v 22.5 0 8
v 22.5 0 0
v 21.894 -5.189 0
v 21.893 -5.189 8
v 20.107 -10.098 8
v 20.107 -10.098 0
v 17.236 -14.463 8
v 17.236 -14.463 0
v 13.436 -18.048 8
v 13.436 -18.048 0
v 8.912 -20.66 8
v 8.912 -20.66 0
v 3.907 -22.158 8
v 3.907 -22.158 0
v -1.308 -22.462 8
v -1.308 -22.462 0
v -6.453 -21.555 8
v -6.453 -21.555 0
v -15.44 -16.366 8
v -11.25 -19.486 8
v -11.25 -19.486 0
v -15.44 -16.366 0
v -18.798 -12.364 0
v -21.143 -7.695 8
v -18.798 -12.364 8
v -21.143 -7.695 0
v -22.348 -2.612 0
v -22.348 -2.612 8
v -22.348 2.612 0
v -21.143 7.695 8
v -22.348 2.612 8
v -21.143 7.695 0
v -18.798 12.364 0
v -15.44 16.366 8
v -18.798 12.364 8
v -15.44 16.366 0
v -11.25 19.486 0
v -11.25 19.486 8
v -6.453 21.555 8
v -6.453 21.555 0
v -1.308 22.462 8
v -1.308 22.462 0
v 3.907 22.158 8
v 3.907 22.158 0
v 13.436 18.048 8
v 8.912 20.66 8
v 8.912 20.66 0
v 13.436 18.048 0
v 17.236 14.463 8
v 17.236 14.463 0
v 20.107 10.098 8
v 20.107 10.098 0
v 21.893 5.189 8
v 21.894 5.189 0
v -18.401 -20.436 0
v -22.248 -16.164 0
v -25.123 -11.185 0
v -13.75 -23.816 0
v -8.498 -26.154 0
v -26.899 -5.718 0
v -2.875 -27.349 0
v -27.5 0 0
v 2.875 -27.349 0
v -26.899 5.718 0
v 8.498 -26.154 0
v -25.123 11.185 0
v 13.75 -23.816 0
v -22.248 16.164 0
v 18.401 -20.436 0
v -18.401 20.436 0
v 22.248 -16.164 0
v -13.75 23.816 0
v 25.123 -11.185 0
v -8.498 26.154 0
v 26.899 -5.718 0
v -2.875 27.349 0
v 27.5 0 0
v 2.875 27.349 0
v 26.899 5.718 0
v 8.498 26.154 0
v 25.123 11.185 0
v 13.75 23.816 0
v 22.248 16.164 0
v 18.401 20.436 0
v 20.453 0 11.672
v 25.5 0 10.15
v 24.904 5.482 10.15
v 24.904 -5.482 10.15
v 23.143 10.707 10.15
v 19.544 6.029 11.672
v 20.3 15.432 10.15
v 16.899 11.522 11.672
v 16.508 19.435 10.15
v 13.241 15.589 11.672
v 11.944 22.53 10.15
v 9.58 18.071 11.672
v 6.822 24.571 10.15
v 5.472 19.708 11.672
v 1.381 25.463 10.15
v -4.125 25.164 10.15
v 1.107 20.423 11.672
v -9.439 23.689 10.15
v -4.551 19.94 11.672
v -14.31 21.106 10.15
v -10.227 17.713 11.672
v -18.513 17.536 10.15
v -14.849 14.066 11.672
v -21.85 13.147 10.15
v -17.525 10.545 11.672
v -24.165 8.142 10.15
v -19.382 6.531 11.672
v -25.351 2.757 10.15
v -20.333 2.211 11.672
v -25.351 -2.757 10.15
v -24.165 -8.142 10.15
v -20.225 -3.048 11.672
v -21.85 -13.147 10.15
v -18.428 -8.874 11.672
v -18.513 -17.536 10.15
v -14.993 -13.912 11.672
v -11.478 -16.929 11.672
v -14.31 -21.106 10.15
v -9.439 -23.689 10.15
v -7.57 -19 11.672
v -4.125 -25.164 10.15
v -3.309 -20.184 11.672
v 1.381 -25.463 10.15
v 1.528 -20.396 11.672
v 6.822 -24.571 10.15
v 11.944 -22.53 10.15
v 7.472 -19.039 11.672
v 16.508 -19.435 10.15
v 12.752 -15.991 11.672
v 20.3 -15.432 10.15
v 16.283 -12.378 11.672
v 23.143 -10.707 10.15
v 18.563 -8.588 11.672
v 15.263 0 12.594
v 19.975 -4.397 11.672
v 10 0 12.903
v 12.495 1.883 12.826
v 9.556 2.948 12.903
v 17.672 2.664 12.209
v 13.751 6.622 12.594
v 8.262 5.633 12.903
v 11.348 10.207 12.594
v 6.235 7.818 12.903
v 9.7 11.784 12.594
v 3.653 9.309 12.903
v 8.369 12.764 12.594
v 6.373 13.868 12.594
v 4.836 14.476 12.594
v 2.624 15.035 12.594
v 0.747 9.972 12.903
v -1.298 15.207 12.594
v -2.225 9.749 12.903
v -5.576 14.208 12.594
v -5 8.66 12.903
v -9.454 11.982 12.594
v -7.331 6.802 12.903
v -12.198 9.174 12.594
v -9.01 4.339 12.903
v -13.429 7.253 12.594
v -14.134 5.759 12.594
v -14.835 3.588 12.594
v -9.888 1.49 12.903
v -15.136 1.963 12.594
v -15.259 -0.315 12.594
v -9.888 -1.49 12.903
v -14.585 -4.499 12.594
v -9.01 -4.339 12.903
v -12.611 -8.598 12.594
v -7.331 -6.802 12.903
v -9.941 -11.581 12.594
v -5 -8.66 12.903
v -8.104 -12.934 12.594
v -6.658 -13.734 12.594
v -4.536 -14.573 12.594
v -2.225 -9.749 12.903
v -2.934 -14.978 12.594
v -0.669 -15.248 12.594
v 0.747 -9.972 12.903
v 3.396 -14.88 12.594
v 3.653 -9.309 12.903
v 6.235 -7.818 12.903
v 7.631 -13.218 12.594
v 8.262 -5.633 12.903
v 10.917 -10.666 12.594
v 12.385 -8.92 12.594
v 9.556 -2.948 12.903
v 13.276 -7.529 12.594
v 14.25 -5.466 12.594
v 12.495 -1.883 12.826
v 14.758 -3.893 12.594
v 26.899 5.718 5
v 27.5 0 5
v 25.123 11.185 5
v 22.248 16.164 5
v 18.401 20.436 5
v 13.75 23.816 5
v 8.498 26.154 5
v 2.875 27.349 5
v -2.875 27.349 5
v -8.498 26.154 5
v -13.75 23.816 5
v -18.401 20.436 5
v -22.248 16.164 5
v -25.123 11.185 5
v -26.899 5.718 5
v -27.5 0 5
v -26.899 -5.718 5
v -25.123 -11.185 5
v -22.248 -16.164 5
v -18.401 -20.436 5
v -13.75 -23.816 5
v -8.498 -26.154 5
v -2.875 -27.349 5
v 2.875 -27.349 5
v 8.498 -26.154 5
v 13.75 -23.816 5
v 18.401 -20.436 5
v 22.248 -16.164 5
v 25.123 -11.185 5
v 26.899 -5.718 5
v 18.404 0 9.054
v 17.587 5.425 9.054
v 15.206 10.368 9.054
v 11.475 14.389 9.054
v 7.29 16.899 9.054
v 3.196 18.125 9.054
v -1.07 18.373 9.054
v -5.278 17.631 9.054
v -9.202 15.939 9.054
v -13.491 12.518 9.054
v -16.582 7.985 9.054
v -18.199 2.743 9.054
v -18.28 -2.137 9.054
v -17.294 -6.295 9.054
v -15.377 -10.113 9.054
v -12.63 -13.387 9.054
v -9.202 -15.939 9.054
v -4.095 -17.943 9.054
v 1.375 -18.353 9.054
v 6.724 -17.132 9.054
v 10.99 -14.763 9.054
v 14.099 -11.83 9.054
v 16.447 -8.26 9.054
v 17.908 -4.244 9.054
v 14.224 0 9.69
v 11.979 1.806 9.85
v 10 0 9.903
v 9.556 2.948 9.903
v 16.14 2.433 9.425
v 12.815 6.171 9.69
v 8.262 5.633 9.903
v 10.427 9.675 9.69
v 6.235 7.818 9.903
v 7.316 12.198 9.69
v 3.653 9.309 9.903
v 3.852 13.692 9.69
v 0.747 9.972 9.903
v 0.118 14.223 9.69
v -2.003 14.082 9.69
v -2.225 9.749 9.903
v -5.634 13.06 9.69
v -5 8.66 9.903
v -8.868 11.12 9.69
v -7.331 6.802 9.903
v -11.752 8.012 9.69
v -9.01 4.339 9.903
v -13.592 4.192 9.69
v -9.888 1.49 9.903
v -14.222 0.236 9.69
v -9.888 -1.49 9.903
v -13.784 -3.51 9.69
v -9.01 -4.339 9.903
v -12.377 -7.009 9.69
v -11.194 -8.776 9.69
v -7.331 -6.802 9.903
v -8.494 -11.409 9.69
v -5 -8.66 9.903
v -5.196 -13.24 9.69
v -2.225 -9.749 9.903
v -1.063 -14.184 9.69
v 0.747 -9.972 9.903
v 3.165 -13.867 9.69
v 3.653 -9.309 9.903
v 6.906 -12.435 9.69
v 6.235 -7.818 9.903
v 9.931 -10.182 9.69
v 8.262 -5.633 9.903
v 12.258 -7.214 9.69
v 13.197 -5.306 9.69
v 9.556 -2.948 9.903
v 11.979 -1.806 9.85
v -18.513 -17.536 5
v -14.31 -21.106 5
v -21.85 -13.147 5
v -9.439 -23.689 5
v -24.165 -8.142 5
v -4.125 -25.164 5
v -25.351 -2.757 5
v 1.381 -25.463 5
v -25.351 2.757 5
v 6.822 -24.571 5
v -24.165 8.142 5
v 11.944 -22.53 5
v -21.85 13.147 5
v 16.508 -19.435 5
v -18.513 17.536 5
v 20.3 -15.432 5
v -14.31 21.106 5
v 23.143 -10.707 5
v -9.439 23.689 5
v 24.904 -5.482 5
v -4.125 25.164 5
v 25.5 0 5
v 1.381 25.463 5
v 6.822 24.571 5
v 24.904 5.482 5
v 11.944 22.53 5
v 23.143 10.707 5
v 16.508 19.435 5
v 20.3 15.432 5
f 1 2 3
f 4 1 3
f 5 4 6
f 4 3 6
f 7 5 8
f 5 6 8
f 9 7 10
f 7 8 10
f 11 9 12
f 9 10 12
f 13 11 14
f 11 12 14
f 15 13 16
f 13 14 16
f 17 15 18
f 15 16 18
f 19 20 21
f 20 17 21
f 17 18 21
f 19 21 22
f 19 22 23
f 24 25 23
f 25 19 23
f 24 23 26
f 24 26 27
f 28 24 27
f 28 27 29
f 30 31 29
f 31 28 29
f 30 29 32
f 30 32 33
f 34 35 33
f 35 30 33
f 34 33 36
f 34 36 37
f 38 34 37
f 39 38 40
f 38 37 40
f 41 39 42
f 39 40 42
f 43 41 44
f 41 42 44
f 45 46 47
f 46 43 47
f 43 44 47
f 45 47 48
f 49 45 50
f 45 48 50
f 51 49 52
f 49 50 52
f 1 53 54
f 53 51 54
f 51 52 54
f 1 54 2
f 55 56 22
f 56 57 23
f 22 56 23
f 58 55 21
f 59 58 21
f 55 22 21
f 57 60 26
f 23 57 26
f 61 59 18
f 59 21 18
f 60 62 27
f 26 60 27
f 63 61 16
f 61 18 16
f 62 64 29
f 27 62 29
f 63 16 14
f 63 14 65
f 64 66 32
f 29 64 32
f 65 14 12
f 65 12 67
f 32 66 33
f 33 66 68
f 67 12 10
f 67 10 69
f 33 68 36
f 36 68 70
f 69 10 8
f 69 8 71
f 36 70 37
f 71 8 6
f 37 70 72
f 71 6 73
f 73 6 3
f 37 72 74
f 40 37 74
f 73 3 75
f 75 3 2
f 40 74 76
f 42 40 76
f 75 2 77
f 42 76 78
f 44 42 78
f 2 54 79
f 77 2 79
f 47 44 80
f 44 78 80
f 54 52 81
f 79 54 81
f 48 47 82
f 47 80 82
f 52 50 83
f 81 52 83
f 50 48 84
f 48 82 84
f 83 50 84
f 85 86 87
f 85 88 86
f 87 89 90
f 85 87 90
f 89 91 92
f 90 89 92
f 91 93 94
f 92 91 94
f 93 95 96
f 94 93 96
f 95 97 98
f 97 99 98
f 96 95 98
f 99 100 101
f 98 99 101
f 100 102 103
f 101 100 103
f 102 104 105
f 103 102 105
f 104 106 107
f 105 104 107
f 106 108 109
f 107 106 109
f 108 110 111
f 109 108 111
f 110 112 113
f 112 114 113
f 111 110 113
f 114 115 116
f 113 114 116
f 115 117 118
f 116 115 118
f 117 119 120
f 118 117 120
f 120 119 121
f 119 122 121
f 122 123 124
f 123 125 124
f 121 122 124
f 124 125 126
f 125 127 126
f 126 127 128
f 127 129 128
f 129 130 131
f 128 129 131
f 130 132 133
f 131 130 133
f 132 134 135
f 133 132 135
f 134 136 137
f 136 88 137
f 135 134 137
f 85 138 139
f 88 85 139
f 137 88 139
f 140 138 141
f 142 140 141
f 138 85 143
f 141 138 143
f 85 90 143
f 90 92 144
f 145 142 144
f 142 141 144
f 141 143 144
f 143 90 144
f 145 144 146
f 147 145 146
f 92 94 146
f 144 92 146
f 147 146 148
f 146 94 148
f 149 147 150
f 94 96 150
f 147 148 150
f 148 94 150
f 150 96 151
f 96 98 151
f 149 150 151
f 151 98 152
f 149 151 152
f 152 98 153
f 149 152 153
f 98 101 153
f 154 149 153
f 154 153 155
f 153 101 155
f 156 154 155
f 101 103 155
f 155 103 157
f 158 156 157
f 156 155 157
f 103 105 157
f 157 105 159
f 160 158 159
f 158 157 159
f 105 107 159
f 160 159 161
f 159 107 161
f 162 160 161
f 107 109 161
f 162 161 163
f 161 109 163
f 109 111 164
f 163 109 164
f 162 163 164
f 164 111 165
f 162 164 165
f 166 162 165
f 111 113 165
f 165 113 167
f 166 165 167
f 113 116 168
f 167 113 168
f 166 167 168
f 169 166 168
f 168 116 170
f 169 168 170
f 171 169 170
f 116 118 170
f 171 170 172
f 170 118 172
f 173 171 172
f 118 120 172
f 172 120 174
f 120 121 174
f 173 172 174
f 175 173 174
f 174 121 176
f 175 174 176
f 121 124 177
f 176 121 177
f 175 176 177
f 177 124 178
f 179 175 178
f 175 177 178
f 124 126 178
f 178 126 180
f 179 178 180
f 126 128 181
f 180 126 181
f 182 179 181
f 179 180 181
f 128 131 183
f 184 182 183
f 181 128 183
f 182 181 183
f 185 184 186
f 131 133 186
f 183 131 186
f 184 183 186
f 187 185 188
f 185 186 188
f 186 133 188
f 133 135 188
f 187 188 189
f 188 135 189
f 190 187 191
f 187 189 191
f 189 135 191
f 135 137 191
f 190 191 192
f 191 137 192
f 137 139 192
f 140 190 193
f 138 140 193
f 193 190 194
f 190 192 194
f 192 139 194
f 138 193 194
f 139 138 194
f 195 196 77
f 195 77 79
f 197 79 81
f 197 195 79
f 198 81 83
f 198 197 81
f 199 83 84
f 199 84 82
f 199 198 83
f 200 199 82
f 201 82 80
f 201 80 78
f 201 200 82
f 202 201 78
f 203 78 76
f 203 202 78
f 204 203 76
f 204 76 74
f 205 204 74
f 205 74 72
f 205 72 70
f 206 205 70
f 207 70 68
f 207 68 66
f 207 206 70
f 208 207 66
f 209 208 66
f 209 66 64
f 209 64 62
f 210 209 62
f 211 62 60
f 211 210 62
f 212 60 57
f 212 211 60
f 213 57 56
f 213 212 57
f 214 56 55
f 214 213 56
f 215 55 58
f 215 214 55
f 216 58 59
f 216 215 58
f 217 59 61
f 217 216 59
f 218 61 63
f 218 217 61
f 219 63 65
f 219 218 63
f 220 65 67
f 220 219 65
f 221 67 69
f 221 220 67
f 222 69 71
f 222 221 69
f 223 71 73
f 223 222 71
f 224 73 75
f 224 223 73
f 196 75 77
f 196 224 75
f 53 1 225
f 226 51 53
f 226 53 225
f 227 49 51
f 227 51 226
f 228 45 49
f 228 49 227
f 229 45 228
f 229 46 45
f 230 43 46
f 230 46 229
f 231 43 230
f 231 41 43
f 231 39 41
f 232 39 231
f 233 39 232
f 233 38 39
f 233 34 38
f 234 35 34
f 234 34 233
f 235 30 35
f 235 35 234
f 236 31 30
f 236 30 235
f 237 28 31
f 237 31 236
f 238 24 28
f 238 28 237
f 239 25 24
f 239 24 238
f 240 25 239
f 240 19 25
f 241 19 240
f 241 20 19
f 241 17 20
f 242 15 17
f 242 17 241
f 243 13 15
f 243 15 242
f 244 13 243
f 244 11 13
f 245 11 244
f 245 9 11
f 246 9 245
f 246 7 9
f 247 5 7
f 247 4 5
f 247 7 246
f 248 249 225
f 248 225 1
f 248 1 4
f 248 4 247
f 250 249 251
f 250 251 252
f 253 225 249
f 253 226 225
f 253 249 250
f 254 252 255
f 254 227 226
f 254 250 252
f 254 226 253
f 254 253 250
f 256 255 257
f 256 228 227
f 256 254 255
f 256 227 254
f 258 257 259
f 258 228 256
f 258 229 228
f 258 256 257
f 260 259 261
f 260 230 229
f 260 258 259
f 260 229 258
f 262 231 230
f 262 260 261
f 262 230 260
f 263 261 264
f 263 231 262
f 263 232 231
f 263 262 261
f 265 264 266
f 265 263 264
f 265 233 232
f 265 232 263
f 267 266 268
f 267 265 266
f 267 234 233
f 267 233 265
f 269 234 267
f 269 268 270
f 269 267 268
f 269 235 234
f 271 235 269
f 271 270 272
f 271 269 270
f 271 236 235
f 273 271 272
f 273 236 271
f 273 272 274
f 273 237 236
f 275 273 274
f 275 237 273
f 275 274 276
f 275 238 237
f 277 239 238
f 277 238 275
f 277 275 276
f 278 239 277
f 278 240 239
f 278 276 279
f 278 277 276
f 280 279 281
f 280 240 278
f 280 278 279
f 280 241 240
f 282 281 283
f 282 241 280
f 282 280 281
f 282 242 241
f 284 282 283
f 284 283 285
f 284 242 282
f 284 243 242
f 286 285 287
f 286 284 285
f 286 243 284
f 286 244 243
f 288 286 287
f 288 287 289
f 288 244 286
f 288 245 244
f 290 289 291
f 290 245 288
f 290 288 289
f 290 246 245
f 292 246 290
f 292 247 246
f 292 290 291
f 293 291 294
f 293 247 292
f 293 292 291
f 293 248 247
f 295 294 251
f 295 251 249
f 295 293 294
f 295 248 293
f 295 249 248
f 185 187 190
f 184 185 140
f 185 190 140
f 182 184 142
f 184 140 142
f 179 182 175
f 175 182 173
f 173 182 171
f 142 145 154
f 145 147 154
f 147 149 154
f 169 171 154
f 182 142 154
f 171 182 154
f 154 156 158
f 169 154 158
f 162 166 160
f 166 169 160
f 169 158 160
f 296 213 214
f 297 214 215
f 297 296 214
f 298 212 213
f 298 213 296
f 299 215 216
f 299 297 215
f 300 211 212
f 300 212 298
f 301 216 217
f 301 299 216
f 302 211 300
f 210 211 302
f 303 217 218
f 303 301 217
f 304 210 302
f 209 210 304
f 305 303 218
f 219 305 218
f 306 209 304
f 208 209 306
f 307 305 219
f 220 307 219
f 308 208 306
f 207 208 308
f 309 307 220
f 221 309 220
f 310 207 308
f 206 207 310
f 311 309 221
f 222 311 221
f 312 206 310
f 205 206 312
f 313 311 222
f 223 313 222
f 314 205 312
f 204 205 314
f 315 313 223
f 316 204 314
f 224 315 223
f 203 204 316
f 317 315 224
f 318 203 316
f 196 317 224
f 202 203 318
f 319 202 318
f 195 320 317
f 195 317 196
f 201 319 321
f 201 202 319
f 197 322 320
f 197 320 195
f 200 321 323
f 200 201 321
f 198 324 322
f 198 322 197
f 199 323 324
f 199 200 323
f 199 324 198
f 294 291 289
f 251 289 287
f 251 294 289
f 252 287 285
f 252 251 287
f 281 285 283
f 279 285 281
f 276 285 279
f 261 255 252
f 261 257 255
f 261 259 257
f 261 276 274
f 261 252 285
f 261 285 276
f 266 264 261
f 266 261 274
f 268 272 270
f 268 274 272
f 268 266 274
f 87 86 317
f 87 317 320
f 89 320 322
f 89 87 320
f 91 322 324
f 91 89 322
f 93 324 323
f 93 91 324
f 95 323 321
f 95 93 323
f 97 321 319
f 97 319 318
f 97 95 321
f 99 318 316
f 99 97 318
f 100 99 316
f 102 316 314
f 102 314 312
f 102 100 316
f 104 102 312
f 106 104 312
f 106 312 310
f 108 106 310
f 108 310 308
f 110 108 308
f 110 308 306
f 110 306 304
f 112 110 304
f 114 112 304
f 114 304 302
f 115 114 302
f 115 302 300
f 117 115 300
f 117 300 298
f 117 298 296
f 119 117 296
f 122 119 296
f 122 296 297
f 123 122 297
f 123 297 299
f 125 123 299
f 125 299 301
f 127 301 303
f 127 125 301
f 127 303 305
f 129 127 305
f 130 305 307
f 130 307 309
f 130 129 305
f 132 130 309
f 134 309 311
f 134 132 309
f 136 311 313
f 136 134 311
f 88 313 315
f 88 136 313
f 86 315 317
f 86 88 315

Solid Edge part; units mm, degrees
sketch "Sketch1" plane through (0, 0, 0) normal (0, -1, 0) x (1, 0, 0)
  line L0 (22.5, 0) -> (27.5, 0)
  line L1 (27.5, 0) -> (27.5, 5)
  line L2 (27.5, 5) -> (25.5, 5)
  line L3 (25.5, 5) -> (25.5, 10.1495)
  arc A0 (10, 12.9032) -> (25.5, 10.1495) centre (10, -32.0968) cw
  line L4 (0, 12.9032) -> (10, 12.9032)
  line L5 (0, 9.9032) -> (0, 12.9032)
  line L6 (0, 9.9032) -> (10, 9.9032)
  arc A1 (10, 9.9032) -> (22.5, 8) centre (10, -32.0968) cw
  line L7 (22.5, 8) -> (22.5, 0)
  dimension "D1" = 3
  dimension "D2" = 5
  dimension "D3" = 2
  dimension "D4" = 10
  dimension "D5" = 45
  dimension "D6" = 8
revolve "RevolvedProtrusion1" add sketch "Sketch1" angle 360 about axis through (0, 0, 0) along (0, 0, 1)
properties material "Steel"
